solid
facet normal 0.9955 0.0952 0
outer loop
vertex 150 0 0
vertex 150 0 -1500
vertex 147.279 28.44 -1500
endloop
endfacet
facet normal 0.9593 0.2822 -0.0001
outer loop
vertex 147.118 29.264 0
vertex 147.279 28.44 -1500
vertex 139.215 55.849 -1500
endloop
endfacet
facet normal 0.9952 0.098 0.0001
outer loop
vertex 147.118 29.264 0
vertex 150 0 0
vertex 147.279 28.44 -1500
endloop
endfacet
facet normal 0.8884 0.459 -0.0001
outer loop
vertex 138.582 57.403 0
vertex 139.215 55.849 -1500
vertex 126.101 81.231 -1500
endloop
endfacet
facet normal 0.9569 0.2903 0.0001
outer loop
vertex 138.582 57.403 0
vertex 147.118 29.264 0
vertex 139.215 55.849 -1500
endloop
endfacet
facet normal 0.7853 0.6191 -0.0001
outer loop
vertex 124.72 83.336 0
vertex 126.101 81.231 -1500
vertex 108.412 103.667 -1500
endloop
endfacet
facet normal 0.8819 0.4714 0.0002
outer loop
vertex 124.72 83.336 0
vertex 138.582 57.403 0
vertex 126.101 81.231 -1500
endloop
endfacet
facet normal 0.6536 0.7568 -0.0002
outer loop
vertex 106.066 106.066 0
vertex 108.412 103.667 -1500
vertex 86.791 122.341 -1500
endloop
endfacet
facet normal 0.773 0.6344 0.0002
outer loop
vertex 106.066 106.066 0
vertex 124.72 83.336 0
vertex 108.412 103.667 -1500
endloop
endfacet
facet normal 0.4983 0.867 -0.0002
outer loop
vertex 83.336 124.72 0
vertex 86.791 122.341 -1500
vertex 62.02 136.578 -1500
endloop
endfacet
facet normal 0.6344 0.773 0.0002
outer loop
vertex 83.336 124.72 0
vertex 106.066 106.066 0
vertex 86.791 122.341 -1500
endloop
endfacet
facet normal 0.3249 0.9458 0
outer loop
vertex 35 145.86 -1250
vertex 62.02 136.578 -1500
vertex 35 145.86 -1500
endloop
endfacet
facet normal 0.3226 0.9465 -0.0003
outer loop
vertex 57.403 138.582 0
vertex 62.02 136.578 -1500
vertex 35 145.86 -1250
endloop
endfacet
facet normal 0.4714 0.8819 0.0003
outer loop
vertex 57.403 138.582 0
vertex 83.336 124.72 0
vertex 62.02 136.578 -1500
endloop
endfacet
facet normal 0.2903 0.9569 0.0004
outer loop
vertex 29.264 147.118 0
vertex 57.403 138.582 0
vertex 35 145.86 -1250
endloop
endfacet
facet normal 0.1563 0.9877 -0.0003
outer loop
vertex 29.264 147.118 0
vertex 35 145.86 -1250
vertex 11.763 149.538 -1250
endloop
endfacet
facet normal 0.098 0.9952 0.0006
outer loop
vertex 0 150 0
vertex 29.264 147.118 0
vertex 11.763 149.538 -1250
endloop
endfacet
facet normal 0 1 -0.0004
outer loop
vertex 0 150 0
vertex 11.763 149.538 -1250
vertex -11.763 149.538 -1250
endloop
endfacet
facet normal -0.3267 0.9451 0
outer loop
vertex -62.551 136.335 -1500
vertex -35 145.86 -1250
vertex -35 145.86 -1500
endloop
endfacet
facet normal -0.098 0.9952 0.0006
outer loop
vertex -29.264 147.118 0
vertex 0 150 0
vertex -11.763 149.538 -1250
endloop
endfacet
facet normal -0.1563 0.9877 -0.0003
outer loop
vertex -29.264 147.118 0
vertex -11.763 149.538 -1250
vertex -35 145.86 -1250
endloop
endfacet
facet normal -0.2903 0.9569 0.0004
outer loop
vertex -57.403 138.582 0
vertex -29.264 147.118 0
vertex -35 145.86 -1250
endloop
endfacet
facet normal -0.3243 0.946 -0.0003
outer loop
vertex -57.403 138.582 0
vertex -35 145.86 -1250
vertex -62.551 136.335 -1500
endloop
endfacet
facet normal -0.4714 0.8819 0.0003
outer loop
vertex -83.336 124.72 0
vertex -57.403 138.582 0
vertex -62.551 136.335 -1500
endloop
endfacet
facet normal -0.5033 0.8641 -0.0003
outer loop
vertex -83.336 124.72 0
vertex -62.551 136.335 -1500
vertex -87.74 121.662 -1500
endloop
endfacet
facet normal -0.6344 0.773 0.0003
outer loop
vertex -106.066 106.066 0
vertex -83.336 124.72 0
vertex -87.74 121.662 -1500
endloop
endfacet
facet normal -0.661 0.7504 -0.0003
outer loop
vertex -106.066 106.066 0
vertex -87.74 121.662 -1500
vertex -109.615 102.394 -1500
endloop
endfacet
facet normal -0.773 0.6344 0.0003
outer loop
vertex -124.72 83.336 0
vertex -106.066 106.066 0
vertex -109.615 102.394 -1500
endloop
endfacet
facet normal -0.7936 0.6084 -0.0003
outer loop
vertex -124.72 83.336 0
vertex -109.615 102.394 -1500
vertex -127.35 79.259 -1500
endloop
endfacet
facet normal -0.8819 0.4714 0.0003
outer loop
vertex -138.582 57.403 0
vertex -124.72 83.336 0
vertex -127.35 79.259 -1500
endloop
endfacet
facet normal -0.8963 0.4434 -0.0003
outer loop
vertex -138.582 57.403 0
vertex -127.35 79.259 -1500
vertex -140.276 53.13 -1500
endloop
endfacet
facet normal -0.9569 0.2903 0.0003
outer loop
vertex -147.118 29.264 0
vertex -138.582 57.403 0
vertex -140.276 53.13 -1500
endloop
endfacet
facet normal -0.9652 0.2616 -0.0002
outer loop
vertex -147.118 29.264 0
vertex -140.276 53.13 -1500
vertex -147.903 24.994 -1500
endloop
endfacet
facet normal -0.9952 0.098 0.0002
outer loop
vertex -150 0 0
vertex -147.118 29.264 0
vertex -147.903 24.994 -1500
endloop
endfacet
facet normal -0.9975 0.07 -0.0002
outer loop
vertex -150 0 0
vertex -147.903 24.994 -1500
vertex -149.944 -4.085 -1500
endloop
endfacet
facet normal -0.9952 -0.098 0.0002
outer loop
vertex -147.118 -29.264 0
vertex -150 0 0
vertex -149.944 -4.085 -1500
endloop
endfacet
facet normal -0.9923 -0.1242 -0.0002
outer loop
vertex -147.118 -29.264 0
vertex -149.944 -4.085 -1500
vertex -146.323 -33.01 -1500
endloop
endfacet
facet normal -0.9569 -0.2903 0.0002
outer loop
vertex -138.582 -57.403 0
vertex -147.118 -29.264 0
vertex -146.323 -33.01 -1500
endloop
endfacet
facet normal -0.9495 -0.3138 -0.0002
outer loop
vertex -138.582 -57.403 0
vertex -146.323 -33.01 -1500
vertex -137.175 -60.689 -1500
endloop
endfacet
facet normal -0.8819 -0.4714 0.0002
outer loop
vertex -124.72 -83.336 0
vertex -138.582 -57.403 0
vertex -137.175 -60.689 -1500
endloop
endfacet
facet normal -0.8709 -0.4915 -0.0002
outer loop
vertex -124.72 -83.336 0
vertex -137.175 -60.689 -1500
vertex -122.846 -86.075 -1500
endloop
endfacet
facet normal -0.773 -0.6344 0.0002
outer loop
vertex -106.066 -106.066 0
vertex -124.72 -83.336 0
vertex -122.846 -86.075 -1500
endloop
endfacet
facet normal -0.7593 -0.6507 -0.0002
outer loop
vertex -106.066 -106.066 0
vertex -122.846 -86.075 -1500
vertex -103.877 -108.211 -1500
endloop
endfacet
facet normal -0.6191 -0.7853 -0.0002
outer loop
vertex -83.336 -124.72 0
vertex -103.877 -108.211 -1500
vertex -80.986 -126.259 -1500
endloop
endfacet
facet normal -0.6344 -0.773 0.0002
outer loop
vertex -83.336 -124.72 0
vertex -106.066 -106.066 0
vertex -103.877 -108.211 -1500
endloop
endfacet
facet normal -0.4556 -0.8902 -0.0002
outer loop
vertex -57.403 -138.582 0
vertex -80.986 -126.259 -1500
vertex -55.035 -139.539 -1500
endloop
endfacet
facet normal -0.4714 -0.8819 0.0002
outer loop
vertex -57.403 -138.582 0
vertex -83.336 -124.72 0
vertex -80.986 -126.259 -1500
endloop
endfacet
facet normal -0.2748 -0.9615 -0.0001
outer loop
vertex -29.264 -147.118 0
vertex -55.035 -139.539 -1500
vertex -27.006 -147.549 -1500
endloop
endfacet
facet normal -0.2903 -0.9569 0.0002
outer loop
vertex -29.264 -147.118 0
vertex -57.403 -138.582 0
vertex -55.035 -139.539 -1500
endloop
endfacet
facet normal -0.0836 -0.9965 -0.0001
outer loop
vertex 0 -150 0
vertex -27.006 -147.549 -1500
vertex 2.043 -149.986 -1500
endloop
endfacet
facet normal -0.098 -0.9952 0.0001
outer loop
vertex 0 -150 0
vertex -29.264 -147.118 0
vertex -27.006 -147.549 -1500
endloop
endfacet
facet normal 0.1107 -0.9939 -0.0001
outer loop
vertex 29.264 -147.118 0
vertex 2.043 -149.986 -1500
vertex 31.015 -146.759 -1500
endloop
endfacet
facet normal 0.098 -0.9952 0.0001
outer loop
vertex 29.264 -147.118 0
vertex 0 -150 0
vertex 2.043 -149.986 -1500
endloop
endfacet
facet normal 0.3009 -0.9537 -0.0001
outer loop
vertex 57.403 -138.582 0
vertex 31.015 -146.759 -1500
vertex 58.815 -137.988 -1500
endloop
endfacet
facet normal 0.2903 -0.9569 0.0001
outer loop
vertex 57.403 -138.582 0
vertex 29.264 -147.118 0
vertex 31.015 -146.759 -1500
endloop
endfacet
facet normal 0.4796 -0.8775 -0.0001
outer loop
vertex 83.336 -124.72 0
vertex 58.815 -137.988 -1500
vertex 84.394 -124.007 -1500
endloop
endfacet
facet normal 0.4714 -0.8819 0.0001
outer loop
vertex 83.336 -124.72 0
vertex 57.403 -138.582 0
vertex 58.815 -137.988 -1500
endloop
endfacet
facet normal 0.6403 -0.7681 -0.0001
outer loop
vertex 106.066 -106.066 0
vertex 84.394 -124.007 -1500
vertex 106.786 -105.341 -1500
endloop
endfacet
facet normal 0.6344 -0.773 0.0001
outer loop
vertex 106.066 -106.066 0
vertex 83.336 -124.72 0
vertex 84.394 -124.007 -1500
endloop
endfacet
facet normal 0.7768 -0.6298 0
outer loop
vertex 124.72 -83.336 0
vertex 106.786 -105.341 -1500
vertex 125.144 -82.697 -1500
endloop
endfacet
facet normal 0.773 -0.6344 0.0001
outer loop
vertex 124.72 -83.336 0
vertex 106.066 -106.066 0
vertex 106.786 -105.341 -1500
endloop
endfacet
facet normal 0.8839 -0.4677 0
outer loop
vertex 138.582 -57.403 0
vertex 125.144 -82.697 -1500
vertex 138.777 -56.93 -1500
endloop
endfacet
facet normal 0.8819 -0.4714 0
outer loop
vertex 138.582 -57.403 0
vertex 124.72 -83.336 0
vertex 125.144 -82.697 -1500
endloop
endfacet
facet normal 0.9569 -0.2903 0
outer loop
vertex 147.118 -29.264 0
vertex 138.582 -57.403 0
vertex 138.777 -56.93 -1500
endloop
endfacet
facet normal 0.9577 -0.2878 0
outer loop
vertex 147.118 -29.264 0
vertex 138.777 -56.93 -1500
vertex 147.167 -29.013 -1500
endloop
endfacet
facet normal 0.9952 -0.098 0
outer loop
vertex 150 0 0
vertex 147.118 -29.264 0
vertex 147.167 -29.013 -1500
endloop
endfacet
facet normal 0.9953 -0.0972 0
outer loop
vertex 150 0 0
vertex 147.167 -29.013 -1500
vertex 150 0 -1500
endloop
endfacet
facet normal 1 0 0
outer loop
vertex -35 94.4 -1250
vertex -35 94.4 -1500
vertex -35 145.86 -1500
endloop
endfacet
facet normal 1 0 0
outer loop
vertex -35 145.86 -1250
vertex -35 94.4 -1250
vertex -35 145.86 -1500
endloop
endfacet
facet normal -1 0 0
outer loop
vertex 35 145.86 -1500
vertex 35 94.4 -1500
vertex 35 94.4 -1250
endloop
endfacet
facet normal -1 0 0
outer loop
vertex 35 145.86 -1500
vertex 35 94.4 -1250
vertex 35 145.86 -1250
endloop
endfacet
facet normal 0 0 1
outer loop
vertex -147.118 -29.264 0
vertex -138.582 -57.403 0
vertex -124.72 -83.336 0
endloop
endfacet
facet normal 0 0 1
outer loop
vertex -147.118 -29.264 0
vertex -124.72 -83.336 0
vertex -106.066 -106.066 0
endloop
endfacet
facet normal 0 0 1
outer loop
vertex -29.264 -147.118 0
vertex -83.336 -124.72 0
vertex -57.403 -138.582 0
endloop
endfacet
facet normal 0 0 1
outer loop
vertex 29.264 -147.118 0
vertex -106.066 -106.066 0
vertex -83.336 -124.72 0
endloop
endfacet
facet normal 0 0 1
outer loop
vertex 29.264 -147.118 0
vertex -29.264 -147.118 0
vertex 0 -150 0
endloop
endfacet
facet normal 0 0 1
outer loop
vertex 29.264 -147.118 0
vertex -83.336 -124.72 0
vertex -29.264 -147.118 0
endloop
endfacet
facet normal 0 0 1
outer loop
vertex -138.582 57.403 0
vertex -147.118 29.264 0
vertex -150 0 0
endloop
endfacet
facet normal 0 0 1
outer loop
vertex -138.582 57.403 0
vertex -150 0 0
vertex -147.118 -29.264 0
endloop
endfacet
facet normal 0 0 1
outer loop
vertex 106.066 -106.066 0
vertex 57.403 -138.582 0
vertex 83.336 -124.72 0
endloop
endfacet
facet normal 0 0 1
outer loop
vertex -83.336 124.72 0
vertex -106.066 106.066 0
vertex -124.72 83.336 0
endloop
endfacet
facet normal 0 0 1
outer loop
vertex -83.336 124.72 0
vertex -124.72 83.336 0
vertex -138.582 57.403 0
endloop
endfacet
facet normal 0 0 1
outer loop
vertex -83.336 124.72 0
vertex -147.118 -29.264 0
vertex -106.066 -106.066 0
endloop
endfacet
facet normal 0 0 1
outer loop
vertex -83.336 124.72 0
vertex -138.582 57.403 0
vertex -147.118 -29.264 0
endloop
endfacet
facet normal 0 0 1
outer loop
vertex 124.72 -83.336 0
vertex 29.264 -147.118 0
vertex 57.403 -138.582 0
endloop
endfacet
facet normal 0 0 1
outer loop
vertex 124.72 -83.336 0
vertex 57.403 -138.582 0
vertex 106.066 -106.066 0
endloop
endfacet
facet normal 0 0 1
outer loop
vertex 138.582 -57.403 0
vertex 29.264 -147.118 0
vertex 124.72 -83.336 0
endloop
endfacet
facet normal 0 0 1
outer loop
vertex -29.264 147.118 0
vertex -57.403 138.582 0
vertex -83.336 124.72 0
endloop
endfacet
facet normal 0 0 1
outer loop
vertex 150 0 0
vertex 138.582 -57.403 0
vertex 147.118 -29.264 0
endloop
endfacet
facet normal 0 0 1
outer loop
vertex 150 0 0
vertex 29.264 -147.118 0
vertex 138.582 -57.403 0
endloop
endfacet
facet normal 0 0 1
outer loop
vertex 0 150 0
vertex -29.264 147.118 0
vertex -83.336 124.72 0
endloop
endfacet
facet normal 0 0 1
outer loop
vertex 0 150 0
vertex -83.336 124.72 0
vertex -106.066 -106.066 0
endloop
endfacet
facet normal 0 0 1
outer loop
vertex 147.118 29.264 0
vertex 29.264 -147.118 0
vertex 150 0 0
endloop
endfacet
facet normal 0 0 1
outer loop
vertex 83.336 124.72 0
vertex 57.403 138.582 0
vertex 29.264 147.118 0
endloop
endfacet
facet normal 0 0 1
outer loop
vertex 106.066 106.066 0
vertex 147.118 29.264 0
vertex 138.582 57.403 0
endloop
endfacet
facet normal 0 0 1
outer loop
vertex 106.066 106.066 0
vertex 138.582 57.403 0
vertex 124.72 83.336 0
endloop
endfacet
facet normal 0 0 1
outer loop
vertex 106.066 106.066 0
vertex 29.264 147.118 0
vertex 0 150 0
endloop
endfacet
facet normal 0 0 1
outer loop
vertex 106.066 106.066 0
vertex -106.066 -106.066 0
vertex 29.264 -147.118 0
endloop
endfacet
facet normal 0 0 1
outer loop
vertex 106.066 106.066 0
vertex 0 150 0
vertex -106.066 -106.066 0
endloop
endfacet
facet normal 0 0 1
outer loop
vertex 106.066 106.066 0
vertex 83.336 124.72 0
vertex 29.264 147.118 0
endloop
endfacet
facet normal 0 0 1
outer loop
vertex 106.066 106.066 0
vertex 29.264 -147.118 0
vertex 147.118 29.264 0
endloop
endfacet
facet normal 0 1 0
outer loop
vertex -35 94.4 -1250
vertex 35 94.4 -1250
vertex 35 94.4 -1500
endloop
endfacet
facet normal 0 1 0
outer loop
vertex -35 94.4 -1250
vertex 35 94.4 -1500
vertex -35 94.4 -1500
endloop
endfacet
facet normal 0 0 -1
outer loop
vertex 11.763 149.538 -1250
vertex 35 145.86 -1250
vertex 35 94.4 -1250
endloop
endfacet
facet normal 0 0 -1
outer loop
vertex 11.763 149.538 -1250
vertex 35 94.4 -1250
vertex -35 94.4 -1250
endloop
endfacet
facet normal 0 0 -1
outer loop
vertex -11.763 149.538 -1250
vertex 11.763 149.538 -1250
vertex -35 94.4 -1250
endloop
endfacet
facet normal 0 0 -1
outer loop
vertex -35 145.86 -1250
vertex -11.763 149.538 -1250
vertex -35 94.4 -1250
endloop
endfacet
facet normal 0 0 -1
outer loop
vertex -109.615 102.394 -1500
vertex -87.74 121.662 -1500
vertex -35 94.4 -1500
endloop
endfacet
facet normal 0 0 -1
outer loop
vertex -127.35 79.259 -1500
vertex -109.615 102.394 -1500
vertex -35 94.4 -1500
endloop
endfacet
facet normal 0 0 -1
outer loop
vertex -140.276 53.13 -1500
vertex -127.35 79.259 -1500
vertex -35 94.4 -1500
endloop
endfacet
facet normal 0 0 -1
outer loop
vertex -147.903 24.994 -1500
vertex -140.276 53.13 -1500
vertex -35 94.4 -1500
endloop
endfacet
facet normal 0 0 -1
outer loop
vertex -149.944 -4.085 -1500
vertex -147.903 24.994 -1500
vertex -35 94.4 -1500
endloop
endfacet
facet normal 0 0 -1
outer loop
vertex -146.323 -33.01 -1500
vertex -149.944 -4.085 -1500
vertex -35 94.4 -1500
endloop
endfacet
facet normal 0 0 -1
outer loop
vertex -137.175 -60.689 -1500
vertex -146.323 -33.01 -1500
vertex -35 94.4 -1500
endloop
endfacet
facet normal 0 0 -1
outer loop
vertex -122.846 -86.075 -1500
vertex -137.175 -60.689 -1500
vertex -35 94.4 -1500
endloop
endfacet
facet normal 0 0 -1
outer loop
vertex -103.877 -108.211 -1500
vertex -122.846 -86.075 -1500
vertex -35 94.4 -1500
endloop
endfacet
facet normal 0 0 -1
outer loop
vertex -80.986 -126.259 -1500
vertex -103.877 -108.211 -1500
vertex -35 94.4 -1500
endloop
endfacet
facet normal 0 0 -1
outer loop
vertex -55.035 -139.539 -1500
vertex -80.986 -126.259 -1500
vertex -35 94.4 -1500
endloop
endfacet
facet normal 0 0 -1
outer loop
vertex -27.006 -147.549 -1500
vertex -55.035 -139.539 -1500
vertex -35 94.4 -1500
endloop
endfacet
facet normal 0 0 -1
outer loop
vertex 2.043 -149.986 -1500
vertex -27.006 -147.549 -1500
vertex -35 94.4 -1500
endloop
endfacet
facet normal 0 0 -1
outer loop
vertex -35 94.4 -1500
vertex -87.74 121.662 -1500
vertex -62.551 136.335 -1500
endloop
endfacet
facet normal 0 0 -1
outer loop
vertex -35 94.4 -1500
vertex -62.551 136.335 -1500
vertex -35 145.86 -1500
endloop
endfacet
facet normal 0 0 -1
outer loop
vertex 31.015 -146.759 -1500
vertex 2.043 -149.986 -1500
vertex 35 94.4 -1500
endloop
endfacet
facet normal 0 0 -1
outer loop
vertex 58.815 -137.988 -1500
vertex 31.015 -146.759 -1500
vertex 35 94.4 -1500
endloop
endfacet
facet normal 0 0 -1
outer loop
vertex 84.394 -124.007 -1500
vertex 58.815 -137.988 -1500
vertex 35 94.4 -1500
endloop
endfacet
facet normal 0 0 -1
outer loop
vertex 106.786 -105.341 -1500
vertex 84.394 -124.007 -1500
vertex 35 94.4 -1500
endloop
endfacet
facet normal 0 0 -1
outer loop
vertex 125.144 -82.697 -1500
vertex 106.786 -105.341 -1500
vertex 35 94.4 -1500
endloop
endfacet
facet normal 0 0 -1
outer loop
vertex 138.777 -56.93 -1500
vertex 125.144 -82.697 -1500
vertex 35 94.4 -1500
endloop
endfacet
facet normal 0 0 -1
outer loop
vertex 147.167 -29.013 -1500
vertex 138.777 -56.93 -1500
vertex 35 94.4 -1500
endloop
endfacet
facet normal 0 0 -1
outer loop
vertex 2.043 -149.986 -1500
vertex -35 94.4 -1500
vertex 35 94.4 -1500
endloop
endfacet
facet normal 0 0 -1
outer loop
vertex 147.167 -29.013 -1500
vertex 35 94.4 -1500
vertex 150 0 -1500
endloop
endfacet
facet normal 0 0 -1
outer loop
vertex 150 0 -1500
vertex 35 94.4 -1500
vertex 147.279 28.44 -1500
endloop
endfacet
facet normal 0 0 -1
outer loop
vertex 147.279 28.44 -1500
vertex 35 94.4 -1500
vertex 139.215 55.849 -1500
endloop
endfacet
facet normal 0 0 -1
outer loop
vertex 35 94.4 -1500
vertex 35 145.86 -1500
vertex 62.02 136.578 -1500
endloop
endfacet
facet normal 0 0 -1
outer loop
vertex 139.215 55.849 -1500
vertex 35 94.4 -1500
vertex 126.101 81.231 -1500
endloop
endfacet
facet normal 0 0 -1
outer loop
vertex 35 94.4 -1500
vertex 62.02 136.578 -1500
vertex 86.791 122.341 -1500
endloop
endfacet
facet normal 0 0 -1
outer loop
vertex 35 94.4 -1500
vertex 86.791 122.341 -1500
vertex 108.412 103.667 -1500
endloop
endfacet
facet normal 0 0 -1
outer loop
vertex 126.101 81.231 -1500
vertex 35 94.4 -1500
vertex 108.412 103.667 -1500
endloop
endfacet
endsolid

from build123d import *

# Parameters (mm, degrees)
SKETCH1_R           = 150
BOSS_EXTRUDE1_DEPTH = 1500
SKETCH3_W           = 70
SKETCH3_H           = 70
CUT_EXTRUDE2_DEPTH  = 250
SKETCH7_R           = 150
SKETCH7_R_2         = 149.9999
EXTRUDE_THIN1_DEPTH = 92.5
EXTRUDE_THIN2_START = -74
SKETCH8_R           = 150
SKETCH8_R_2         = 149.9999
EXTRUDE_THIN2_DEPTH = 74


with BuildPart() as part:
    # Sketch1 → Boss-Extrude1 (new body)
    with BuildSketch(Plane.XY):
        Circle(SKETCH1_R)
    extrude(amount=-BOSS_EXTRUDE1_DEPTH)

    # Sketch3 → Cut-Extrude2 (cut)
    with BuildSketch(Plane(origin=(0, 0, -1500), x_dir=(-1, 0, 0), z_dir=(0, 0, -1))):
        with Locations((0, 129.4)):
            Rectangle(SKETCH3_W, SKETCH3_H)
    extrude(amount=-CUT_EXTRUDE2_DEPTH, mode=Mode.SUBTRACT)

    # Sketch7 → Extrude-Thin1 (add, symmetric)
    with BuildSketch(Plane.XY.offset(-400)):
        Circle(SKETCH7_R)
        Circle(SKETCH7_R_2, mode=Mode.SUBTRACT)
    extrude(amount=EXTRUDE_THIN1_DEPTH, both=True)

    # Sketch8 → Extrude-Thin2 (add)
    with BuildSketch(Plane(origin=(0, 0, -1200), x_dir=(-1, 0, 0), z_dir=(0, 0, -1)).offset(EXTRUDE_THIN2_START)):
        Circle(SKETCH8_R)
        Circle(SKETCH8_R_2, mode=Mode.SUBTRACT)
    extrude(amount=EXTRUDE_THIN2_DEPTH)


solid = part.part
